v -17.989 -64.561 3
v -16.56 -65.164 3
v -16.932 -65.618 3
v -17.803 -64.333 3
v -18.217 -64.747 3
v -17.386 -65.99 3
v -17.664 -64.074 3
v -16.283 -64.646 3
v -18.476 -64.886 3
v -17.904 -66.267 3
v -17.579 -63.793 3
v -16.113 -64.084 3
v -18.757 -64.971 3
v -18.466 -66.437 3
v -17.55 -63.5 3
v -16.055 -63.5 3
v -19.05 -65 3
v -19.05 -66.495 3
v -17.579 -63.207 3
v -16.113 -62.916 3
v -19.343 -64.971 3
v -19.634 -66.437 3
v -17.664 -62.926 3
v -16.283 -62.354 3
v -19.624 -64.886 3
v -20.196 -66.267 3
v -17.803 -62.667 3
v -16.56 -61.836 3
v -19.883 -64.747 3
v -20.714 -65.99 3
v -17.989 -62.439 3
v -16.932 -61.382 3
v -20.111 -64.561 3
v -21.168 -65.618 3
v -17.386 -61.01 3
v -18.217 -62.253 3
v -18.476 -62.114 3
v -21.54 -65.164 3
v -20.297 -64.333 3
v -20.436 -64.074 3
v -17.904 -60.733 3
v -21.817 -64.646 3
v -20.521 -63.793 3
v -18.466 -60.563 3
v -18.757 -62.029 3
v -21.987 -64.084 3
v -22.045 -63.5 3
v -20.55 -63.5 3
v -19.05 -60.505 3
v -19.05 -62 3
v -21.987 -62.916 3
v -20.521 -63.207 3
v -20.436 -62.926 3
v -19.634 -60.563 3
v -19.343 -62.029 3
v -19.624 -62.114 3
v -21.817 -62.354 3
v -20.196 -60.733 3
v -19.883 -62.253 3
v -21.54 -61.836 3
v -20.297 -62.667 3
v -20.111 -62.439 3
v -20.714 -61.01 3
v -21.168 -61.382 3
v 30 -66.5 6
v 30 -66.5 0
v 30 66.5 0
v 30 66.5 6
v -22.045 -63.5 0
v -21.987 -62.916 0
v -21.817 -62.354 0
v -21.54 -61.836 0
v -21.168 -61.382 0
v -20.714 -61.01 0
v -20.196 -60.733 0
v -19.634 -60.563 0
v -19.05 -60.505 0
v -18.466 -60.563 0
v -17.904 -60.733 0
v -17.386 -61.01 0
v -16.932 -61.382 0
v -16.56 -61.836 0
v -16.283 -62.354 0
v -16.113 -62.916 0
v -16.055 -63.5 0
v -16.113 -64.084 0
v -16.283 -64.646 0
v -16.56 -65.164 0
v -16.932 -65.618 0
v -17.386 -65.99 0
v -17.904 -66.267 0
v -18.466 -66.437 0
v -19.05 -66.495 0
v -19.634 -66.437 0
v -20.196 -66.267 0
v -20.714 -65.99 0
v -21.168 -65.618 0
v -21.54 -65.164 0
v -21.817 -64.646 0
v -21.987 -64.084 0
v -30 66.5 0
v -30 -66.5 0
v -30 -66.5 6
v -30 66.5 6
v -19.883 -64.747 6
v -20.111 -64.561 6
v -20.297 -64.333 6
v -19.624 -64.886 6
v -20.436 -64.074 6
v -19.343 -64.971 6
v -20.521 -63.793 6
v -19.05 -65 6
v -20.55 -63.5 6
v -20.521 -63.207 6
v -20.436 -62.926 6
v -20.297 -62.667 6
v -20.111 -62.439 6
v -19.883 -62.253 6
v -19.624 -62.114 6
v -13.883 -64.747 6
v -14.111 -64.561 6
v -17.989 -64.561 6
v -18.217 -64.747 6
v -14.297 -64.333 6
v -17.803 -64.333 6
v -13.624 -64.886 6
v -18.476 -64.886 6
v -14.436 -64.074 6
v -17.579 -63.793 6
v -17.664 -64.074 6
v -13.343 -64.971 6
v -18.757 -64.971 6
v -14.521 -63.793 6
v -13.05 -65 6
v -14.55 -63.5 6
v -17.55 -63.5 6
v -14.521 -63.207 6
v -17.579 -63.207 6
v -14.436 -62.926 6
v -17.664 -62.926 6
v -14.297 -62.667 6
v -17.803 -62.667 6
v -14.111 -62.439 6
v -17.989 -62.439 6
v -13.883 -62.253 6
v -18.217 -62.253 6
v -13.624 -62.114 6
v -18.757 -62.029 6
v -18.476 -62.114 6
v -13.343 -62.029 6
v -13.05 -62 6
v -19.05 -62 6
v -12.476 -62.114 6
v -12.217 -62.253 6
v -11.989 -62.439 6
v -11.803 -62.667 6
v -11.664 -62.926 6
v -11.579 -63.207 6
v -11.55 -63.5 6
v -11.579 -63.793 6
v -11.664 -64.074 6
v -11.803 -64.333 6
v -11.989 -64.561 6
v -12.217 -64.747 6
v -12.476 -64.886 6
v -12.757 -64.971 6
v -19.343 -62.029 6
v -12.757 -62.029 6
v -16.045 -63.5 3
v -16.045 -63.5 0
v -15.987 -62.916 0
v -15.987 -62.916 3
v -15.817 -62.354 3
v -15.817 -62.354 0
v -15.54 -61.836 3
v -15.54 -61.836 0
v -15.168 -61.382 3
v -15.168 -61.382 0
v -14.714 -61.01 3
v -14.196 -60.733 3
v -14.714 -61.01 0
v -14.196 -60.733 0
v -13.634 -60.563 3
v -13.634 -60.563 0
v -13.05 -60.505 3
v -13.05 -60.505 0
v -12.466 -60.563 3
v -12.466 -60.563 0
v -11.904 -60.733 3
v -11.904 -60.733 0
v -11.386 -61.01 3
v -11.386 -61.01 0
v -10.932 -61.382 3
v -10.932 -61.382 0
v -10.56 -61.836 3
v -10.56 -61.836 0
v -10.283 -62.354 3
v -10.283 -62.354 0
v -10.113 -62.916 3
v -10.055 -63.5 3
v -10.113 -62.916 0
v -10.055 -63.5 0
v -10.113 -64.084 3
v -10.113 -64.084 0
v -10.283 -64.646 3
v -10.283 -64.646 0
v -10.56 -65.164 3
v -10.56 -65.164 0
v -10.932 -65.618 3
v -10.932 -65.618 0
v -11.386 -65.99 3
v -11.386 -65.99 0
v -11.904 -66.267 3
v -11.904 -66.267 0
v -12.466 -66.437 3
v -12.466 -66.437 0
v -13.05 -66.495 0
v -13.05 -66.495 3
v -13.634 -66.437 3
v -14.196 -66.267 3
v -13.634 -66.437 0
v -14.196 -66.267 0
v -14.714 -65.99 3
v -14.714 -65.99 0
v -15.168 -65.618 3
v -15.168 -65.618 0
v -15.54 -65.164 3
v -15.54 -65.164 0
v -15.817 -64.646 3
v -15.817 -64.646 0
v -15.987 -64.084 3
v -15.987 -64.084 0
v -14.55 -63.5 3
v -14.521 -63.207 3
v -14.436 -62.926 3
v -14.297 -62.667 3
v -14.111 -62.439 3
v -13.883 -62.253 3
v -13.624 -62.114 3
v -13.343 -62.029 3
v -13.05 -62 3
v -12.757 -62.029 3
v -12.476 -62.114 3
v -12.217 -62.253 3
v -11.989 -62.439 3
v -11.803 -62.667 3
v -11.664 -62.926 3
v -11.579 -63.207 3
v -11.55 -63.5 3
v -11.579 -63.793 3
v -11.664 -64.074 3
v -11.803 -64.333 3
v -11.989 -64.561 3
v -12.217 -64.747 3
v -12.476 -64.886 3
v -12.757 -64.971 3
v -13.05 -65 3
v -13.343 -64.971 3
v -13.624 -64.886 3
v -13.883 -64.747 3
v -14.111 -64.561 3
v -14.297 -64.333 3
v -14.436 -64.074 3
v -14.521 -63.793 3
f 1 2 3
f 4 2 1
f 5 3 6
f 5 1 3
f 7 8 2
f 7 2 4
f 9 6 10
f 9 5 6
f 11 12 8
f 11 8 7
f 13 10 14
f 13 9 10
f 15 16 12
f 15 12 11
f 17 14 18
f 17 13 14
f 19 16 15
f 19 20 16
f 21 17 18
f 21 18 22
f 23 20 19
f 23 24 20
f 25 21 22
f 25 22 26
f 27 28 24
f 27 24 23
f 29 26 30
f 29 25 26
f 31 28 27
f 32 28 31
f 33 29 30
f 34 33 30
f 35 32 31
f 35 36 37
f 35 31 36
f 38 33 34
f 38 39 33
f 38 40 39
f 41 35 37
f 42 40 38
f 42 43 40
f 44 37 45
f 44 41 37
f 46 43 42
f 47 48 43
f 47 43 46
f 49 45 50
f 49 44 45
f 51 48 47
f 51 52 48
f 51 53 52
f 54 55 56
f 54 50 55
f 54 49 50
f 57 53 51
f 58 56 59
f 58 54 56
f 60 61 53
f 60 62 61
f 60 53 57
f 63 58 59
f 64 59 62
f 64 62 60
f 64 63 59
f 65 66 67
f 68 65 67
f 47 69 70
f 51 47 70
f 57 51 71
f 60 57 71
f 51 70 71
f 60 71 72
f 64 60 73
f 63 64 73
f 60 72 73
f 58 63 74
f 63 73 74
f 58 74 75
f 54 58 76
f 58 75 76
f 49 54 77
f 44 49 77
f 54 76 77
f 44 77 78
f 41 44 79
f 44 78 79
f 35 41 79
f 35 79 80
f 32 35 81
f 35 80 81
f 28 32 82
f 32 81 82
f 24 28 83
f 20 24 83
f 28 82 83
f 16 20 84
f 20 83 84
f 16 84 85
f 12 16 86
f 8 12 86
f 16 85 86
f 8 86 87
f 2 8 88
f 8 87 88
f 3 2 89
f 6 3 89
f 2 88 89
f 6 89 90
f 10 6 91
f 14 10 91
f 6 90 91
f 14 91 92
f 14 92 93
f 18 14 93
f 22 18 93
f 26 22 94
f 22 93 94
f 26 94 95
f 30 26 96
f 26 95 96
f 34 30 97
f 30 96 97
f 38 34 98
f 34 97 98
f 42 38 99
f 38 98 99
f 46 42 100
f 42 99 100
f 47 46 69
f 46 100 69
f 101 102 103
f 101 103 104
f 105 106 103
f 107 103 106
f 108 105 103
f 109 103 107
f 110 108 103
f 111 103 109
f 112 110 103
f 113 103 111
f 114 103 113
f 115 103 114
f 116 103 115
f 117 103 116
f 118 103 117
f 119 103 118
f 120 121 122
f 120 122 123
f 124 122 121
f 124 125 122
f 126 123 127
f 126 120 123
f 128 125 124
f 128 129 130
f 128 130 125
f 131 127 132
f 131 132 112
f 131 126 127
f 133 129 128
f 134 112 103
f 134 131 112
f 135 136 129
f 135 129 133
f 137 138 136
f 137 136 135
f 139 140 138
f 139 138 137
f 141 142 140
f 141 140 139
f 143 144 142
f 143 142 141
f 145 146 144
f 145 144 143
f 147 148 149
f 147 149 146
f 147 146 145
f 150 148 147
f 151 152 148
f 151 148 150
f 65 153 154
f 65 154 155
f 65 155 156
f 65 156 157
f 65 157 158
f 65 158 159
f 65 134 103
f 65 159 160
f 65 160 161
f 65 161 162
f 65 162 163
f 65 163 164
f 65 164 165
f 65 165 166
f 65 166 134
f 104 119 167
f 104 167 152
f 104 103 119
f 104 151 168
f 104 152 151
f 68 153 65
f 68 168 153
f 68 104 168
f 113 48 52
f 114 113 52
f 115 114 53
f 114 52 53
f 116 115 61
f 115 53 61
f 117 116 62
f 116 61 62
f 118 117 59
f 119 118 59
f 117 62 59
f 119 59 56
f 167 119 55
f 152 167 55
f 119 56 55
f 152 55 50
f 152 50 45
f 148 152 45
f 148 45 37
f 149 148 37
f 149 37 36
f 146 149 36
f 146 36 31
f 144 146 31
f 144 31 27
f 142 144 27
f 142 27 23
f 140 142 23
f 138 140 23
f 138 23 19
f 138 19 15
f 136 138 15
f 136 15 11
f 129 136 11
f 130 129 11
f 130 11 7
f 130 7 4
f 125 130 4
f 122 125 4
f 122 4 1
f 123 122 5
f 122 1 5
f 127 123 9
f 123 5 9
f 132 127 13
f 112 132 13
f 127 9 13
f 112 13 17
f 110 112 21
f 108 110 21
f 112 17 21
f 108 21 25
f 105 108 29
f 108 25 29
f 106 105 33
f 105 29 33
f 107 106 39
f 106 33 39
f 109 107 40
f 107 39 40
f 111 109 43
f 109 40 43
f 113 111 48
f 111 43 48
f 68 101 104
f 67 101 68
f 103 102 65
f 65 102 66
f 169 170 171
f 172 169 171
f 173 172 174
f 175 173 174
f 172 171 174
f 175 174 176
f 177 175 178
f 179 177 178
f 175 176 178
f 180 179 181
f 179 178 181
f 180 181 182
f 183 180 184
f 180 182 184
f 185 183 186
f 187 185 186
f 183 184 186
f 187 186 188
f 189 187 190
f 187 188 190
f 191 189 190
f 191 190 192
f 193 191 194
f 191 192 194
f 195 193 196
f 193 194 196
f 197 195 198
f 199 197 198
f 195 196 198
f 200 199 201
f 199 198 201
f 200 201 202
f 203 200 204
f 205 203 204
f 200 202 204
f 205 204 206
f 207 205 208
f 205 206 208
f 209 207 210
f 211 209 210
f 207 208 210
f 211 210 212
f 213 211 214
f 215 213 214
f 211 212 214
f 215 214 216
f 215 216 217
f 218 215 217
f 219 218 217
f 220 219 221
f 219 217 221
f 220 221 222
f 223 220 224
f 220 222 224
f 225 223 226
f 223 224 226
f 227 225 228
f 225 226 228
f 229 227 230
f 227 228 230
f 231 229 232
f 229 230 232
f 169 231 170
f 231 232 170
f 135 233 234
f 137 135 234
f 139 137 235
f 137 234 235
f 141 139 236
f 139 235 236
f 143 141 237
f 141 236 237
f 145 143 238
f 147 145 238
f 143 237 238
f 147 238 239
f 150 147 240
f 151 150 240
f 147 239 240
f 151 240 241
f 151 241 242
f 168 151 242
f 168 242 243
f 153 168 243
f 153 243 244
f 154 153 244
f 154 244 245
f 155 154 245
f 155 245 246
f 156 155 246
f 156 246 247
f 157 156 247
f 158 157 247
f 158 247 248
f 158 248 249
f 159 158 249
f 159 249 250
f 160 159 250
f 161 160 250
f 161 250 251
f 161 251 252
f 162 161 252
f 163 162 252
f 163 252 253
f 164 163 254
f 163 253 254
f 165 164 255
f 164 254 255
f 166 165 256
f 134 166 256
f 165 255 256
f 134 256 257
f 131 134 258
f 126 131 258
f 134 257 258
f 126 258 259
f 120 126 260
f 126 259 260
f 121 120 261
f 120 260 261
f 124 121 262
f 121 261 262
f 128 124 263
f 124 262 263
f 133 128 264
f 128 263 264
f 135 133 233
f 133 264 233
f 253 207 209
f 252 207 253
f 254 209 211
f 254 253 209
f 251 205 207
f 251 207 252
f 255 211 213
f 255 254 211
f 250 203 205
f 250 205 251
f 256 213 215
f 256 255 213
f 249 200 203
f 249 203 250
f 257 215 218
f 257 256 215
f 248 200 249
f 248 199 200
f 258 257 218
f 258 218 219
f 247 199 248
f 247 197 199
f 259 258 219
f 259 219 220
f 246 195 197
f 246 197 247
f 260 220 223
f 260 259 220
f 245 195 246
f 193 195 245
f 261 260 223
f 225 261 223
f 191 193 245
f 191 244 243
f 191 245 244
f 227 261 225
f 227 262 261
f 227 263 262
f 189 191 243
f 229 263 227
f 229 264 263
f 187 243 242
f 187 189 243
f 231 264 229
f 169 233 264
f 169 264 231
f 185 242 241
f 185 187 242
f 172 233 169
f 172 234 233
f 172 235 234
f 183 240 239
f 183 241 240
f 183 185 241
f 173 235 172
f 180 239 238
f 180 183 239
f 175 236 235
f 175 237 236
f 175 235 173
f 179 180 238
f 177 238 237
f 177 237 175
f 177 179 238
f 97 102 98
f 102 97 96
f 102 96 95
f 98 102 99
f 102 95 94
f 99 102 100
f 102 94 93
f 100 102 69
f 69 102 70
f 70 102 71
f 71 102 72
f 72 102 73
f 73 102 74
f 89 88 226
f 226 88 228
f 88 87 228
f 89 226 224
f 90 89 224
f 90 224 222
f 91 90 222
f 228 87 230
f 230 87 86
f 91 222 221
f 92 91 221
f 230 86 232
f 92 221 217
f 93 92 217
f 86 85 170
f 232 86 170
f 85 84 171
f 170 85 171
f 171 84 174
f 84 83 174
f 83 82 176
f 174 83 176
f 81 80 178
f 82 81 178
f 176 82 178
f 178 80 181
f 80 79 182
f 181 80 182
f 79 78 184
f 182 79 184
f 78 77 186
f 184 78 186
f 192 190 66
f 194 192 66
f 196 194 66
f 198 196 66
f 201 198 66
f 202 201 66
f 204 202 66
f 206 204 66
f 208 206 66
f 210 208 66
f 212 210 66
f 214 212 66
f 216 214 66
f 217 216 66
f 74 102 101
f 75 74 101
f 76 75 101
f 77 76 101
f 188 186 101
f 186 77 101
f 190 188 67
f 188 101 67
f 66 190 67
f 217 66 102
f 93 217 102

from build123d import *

# Parameters (mm, degrees)
ESQUISSE3_W             = 60
ESQUISSE3_H             = 133
BOSS_EXTRU_2_DEPTH      = 6
ESQUISSE4_R             = 1.5
ENL_V_MAT_EXTRU_1_DEPTH = 74.200068306
ESQUISSE5_R             = 2.995
ENL_V_MAT_EXTRU_2_DEPTH = 3


with BuildPart() as part:
    # Esquisse3 → Boss.-Extru.2 (new body)
    with BuildSketch(Plane.XY):
        Rectangle(ESQUISSE3_W, ESQUISSE3_H)
    extrude(amount=BOSS_EXTRU_2_DEPTH)

    # Esquisse4 → Enlèv. mat.-Extru.1 (cut, through all)
    with BuildSketch(Plane(origin=(0, 0, 0), x_dir=(-1, 0, 0), z_dir=(0, 0, -1))):
        with Locations((13.05, -63.5)):
            Circle(ESQUISSE4_R)
        with Locations((19.05, -63.5)):
            Circle(ESQUISSE4_R)
    extrude(amount=-ENL_V_MAT_EXTRU_1_DEPTH, mode=Mode.SUBTRACT)

    # Esquisse5 → Enlèv. mat.-Extru.2 (cut)
    with BuildSketch(Plane(origin=(0, 0, 0), x_dir=(-1, 0, 0), z_dir=(0, 0, -1))):
        with Locations((13.05, -63.5)):
            Circle(ESQUISSE5_R)
        with Locations((19.05, -63.5)):
            Circle(ESQUISSE5_R)
    extrude(amount=-ENL_V_MAT_EXTRU_2_DEPTH, mode=Mode.SUBTRACT)


solid = part.part
